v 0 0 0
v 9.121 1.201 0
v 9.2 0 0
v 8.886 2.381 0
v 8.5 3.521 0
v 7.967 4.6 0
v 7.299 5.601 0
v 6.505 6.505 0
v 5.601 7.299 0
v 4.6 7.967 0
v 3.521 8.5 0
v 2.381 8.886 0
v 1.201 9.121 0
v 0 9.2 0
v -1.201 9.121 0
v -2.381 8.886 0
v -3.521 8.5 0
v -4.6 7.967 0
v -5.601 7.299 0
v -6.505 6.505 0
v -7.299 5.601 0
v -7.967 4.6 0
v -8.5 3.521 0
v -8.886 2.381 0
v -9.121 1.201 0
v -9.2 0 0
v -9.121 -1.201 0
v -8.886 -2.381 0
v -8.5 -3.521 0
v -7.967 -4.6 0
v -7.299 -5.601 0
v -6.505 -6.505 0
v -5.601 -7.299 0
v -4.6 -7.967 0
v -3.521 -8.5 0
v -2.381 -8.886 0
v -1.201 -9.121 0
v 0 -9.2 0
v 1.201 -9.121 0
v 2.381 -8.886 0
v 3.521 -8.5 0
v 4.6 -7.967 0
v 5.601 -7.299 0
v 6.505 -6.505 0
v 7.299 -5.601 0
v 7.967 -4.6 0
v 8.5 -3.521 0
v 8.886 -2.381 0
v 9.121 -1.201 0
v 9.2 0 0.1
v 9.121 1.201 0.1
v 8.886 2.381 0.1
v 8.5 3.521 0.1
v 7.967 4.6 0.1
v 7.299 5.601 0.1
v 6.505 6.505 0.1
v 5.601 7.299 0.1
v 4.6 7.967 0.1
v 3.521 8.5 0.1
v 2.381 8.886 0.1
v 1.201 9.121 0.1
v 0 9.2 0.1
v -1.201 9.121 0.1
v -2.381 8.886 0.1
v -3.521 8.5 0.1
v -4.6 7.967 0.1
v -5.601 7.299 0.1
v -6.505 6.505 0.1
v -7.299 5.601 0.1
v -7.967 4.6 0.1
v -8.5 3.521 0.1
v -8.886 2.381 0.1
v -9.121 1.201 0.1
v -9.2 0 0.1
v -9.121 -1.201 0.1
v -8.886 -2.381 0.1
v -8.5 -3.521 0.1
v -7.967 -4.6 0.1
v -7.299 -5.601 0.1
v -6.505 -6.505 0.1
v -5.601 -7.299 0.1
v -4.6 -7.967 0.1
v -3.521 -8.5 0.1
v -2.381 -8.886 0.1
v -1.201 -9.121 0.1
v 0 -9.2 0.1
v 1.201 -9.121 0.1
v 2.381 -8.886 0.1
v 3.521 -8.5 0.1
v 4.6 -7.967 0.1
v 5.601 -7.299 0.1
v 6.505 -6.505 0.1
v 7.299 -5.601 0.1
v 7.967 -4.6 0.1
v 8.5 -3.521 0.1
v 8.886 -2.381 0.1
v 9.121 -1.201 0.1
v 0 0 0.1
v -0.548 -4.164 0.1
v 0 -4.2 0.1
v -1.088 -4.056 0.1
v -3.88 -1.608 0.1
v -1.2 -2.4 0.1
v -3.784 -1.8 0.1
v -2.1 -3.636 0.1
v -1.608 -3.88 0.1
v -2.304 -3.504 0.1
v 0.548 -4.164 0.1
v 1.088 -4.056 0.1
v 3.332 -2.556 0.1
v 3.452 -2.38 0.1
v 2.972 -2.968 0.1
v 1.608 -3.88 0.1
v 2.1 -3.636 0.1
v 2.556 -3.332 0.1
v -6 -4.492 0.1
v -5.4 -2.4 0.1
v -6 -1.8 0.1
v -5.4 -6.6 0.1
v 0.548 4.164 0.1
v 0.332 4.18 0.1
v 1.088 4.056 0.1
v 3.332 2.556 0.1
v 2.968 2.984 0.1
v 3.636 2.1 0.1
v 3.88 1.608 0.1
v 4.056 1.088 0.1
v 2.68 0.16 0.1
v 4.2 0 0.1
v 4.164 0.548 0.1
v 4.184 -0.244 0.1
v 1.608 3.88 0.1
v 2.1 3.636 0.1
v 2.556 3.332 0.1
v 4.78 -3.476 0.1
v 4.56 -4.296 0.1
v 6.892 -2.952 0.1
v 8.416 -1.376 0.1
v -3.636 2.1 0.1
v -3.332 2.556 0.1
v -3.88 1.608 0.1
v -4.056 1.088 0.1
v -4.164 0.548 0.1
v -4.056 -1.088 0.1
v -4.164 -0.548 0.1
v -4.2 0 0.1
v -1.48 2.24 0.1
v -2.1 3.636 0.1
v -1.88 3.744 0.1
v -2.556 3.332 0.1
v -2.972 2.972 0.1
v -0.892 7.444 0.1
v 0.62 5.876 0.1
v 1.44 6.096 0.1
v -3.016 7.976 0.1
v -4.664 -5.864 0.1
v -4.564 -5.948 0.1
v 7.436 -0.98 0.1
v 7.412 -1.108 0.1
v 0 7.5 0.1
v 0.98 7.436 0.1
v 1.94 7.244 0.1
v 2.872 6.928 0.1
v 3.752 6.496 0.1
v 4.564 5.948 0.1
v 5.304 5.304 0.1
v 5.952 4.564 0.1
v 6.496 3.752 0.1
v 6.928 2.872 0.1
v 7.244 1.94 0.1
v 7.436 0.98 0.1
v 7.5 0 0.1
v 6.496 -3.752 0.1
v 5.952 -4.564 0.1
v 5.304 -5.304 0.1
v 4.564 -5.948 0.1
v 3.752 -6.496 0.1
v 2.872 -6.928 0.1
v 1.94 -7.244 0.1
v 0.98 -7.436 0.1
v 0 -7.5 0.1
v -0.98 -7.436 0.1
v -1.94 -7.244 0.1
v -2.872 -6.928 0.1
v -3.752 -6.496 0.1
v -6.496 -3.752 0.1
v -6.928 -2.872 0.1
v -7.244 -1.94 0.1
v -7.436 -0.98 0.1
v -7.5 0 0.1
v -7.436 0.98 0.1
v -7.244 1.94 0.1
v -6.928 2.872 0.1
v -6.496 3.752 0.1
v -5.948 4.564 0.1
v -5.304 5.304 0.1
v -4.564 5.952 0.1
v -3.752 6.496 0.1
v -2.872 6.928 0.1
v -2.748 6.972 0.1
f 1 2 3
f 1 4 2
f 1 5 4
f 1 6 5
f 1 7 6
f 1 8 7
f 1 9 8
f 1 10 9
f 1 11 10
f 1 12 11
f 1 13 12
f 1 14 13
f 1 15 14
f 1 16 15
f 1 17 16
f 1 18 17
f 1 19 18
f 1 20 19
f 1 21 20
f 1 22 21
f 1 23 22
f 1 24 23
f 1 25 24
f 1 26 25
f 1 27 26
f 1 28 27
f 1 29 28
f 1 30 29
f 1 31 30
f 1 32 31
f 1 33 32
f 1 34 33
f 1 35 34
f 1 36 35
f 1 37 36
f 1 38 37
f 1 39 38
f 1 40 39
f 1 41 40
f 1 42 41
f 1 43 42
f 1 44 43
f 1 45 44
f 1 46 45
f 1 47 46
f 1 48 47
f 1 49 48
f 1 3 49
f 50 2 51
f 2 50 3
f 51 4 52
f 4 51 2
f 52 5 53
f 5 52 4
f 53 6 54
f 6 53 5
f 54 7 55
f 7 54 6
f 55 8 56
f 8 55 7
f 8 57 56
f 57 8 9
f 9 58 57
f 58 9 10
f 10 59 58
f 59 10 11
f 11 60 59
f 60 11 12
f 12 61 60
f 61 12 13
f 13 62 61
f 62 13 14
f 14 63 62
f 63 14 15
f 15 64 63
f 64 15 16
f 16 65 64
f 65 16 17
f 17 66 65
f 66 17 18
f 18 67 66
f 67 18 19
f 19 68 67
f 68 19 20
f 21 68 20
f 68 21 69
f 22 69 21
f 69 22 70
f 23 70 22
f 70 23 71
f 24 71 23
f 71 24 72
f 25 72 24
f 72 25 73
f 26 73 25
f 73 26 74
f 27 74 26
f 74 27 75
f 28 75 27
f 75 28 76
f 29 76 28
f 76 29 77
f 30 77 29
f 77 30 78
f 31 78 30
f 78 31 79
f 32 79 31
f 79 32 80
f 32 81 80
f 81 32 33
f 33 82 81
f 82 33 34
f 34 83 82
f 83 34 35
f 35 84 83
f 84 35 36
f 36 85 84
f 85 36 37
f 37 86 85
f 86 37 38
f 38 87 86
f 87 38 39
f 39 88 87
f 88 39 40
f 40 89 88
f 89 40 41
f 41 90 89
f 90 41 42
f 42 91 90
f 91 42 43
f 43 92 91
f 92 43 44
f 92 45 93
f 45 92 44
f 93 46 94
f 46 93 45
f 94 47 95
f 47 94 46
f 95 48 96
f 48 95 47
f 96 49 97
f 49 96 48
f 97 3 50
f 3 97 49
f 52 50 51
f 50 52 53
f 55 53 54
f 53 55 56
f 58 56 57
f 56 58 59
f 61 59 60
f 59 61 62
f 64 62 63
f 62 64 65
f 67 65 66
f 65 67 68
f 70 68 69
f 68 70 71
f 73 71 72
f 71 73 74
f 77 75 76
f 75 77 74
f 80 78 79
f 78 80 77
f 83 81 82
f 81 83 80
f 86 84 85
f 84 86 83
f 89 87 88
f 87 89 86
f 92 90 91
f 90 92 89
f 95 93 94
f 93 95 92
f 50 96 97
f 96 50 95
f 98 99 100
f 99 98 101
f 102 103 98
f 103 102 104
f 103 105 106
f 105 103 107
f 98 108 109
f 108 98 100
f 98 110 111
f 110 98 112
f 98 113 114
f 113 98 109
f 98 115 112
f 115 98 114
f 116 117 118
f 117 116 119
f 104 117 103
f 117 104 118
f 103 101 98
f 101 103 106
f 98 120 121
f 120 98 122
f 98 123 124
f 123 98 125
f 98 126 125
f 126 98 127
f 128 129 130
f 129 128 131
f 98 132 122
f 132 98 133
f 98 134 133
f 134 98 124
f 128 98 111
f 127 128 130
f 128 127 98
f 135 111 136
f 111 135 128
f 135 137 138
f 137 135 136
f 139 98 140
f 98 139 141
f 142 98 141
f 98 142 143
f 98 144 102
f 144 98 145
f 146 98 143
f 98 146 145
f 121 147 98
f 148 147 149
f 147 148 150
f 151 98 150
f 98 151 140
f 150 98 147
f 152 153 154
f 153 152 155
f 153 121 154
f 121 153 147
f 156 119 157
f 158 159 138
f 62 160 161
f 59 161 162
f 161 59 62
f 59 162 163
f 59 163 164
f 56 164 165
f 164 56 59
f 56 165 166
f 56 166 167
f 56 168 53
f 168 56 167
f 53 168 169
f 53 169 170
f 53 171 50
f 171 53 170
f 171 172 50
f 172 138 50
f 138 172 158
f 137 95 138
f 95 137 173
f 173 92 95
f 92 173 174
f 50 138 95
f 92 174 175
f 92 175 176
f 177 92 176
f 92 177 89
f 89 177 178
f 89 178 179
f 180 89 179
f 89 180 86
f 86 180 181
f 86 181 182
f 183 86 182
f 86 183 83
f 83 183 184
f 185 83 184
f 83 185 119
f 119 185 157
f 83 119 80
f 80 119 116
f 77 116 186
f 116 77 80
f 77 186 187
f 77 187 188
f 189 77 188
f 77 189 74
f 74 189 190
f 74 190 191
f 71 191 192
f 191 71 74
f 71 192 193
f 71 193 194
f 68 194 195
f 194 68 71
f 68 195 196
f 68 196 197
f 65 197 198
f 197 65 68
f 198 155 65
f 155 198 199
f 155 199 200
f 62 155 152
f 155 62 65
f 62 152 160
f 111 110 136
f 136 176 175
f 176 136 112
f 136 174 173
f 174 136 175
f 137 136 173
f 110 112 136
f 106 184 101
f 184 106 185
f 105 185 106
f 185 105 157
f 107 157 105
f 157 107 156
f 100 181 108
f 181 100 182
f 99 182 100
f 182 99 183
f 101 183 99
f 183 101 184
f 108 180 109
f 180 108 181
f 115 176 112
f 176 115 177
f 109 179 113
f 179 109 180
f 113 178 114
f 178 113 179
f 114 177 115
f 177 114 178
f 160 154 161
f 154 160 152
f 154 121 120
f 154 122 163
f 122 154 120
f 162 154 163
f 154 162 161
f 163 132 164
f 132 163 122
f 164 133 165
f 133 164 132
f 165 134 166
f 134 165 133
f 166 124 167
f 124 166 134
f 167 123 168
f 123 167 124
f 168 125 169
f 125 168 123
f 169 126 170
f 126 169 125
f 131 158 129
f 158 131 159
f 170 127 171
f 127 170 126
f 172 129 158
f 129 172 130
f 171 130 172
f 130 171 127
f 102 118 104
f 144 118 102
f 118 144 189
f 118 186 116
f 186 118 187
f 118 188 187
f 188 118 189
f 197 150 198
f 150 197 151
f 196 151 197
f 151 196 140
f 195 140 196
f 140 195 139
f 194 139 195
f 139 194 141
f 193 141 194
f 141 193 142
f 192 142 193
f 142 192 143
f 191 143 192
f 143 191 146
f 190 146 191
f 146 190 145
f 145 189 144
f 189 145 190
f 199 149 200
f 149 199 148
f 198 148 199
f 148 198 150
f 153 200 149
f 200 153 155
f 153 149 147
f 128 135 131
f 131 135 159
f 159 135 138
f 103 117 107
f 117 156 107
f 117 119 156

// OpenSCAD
// file: ../p/48/1-4cyli.scad
use <../../lib.scad>
function ldraw_lib__48__1_4cyli() = [
// 0 Hi-Res Cylinder 0.25
// 0 Name: 48\1-4cyli.dat
// 0 Author: Magnus Forsberg [MagFors]
// 0 !LDRAW_ORG 48_Primitive UPDATE 2024-01
// 0 !LICENSE Licensed under CC BY 4.0 : see CAreadme.txt
// 
// 0 BFC CERTIFY CCW
  [0,"BFC","CERTIFY"],
  [0,"BFC","CCW"],
// 
// 0 !HISTORY 1999-07-05 [PTadmin] Official Update 1999-05
// 0 !HISTORY 2002-02-28 [hafhead] Added BFC statement
// 0 !HISTORY 2002-04-25 [PTadmin] Official Update 2002-02
// 0 !HISTORY 2007-06-24 [PTadmin] Header formatted for Contributor Agreement
// 0 !HISTORY 2008-07-01 [PTadmin] Official Update 2008-01
// 0 !HISTORY 2008-07-07 [guyvivan] Made BFC'ed CCW (2005-12-06)
// 0 !HISTORY 2009-05-02 [PTadmin] Official Update 2009-01
// 0 !HISTORY 2024-01-03 [MagFors] Complete regeneration, original by Manfred Moolhuysen
// 0 !HISTORY 2024-01-29 [OrionP] Official Update 2024-01
// 
// 4 16 0.9914 0 0.1305 1 0 0 1 1 0 0.9914 1 0.1305
  [4,16,0.9914,0,0.1305,1,0,0,1,1,0,0.9914,1,0.1305],
// 4 16 0.9659 0 0.2588 0.9914 0 0.1305 0.9914 1 0.1305 0.9659 1 0.2588
  [4,16,0.9659,0,0.2588,0.9914,0,0.1305,0.9914,1,0.1305,0.9659,1,0.2588],
// 4 16 0.9239 0 0.3827 0.9659 0 0.2588 0.9659 1 0.2588 0.9239 1 0.3827
  [4,16,0.9239,0,0.3827,0.9659,0,0.2588,0.9659,1,0.2588,0.9239,1,0.3827],
// 4 16 0.866 0 0.5 0.9239 0 0.3827 0.9239 1 0.3827 0.866 1 0.5
  [4,16,0.866,0,0.5,0.9239,0,0.3827,0.9239,1,0.3827,0.866,1,0.5],
// 4 16 0.7934 0 0.6088 0.866 0 0.5 0.866 1 0.5 0.7934 1 0.6088
  [4,16,0.7934,0,0.6088,0.866,0,0.5,0.866,1,0.5,0.7934,1,0.6088],
// 4 16 0.7071 0 0.7071 0.7934 0 0.6088 0.7934 1 0.6088 0.7071 1 0.7071
  [4,16,0.7071,0,0.7071,0.7934,0,0.6088,0.7934,1,0.6088,0.7071,1,0.7071],
// 4 16 0.6088 0 0.7934 0.7071 0 0.7071 0.7071 1 0.7071 0.6088 1 0.7934
  [4,16,0.6088,0,0.7934,0.7071,0,0.7071,0.7071,1,0.7071,0.6088,1,0.7934],
// 4 16 0.5 0 0.866 0.6088 0 0.7934 0.6088 1 0.7934 0.5 1 0.866
  [4,16,0.5,0,0.866,0.6088,0,0.7934,0.6088,1,0.7934,0.5,1,0.866],
// 4 16 0.3827 0 0.9239 0.5 0 0.866 0.5 1 0.866 0.3827 1 0.9239
  [4,16,0.3827,0,0.9239,0.5,0,0.866,0.5,1,0.866,0.3827,1,0.9239],
// 4 16 0.2588 0 0.9659 0.3827 0 0.9239 0.3827 1 0.9239 0.2588 1 0.9659
  [4,16,0.2588,0,0.9659,0.3827,0,0.9239,0.3827,1,0.9239,0.2588,1,0.9659],
// 4 16 0.1305 0 0.9914 0.2588 0 0.9659 0.2588 1 0.9659 0.1305 1 0.9914
  [4,16,0.1305,0,0.9914,0.2588,0,0.9659,0.2588,1,0.9659,0.1305,1,0.9914],
// 4 16 0 0 1 0.1305 0 0.9914 0.1305 1 0.9914 0 1 1
  [4,16,0,0,1,0.1305,0,0.9914,0.1305,1,0.9914,0,1,1],
// 0 // conditional lines
// 5 24 1 1 0 1 0 0 1 1 -0.1317 0.9914 1 0.1305
  [5,24,1,1,0,1,0,0,1,1,-0.1317,0.9914,1,0.1305],
// 5 24 0.9914 1 0.1305 0.9914 0 0.1305 1 1 0 0.9659 1 0.2588
  [5,24,0.9914,1,0.1305,0.9914,0,0.1305,1,1,0,0.9659,1,0.2588],
// 5 24 0.9659 1 0.2588 0.9659 0 0.2588 0.9914 1 0.1305 0.9239 1 0.3827
  [5,24,0.9659,1,0.2588,0.9659,0,0.2588,0.9914,1,0.1305,0.9239,1,0.3827],
// 5 24 0.9239 1 0.3827 0.9239 0 0.3827 0.9659 1 0.2588 0.866 1 0.5
  [5,24,0.9239,1,0.3827,0.9239,0,0.3827,0.9659,1,0.2588,0.866,1,0.5],
// 5 24 0.866 1 0.5 0.866 0 0.5 0.9239 1 0.3827 0.7934 1 0.6088
  [5,24,0.866,1,0.5,0.866,0,0.5,0.9239,1,0.3827,0.7934,1,0.6088],
// 5 24 0.7934 1 0.6088 0.7934 0 0.6088 0.866 1 0.5 0.7071 1 0.7071
  [5,24,0.7934,1,0.6088,0.7934,0,0.6088,0.866,1,0.5,0.7071,1,0.7071],
// 5 24 0.7071 1 0.7071 0.7071 0 0.7071 0.7934 1 0.6088 0.6088 1 0.7934
  [5,24,0.7071,1,0.7071,0.7071,0,0.7071,0.7934,1,0.6088,0.6088,1,0.7934],
// 5 24 0.6088 1 0.7934 0.6088 0 0.7934 0.7071 1 0.7071 0.5 1 0.866
  [5,24,0.6088,1,0.7934,0.6088,0,0.7934,0.7071,1,0.7071,0.5,1,0.866],
// 5 24 0.5 1 0.866 0.5 0 0.866 0.6088 1 0.7934 0.3827 1 0.9239
  [5,24,0.5,1,0.866,0.5,0,0.866,0.6088,1,0.7934,0.3827,1,0.9239],
// 5 24 0.3827 1 0.9239 0.3827 0 0.9239 0.5 1 0.866 0.2588 1 0.9659
  [5,24,0.3827,1,0.9239,0.3827,0,0.9239,0.5,1,0.866,0.2588,1,0.9659],
// 5 24 0.2588 1 0.9659 0.2588 0 0.9659 0.3827 1 0.9239 0.1305 1 0.9914
  [5,24,0.2588,1,0.9659,0.2588,0,0.9659,0.3827,1,0.9239,0.1305,1,0.9914],
// 5 24 0.1305 1 0.9914 0.1305 0 0.9914 0.2588 1 0.9659 0 1 1
  [5,24,0.1305,1,0.9914,0.1305,0,0.9914,0.2588,1,0.9659,0,1,1],
// 5 24 0 1 1 0 0 1 0.1305 1 0.9914 -0.1317 1 1
  [5,24,0,1,1,0,0,1,0.1305,1,0.9914,-0.1317,1,1],
// 0 // Build by LDPartEditor (PrimGen 2.X)
];
module ldraw_lib__48__1_4cyli(step=0, col=false, unit=2/5, alt=false, line=0.2, solid=!$preview)
    makepoly(ldraw_lib__48__1_4cyli(), step=step, col=col, unit=unit, alt=alt, line=line, solid=solid);
ldraw_lib__48__1_4cyli(line=0.2);
// file: ../p/48/4-4disc.scad
use <../../lib.scad>
function ldraw_lib__48__4_4disc() = [
// 0 Hi-Res Disc 1.0
// 0 Name: 48\4-4disc.dat
// 0 Author: Willy Tschager [Holly-Wood]
// 0 !LDRAW_ORG 48_Primitive UPDATE 2024-01
// 0 !LICENSE Licensed under CC BY 4.0 : see CAreadme.txt
// 
// 0 BFC CERTIFY CCW
  [0,"BFC","CERTIFY"],
  [0,"BFC","CCW"],
// 
// 0 !HISTORY 2004-11-06 [PTadmin] Official Update 2004-04
// 0 !HISTORY 2007-06-24 [PTadmin] Header formatted for Contributor Agreement
// 0 !HISTORY 2008-07-01 [PTadmin] Official Update 2008-01
// 0 !HISTORY 2012-02-27 [Philo] Changed to CCW
// 0 !HISTORY 2012-08-09 [PTadmin] Official Update 2012-02
// 0 !HISTORY 2024-01-08 [Holly-Wood] Complete regeneration, original by hmick
// 0 !HISTORY 2024-01-29 [OrionP] Official Update 2024-01
// 
// 3 16 0 0 0 1 0 0 0.9914 0 0.1305
  [3,16,0,0,0,1,0,0,0.9914,0,0.1305],
// 3 16 0 0 0 0.9914 0 0.1305 0.9659 0 0.2588
  [3,16,0,0,0,0.9914,0,0.1305,0.9659,0,0.2588],
// 3 16 0 0 0 0.9659 0 0.2588 0.9239 0 0.3827
  [3,16,0,0,0,0.9659,0,0.2588,0.9239,0,0.3827],
// 3 16 0 0 0 0.9239 0 0.3827 0.866 0 0.5
  [3,16,0,0,0,0.9239,0,0.3827,0.866,0,0.5],
// 3 16 0 0 0 0.866 0 0.5 0.7934 0 0.6088
  [3,16,0,0,0,0.866,0,0.5,0.7934,0,0.6088],
// 3 16 0 0 0 0.7934 0 0.6088 0.7071 0 0.7071
  [3,16,0,0,0,0.7934,0,0.6088,0.7071,0,0.7071],
// 3 16 0 0 0 0.7071 0 0.7071 0.6088 0 0.7934
  [3,16,0,0,0,0.7071,0,0.7071,0.6088,0,0.7934],
// 3 16 0 0 0 0.6088 0 0.7934 0.5 0 0.866
  [3,16,0,0,0,0.6088,0,0.7934,0.5,0,0.866],
// 3 16 0 0 0 0.5 0 0.866 0.3827 0 0.9239
  [3,16,0,0,0,0.5,0,0.866,0.3827,0,0.9239],
// 3 16 0 0 0 0.3827 0 0.9239 0.2588 0 0.9659
  [3,16,0,0,0,0.3827,0,0.9239,0.2588,0,0.9659],
// 3 16 0 0 0 0.2588 0 0.9659 0.1305 0 0.9914
  [3,16,0,0,0,0.2588,0,0.9659,0.1305,0,0.9914],
// 3 16 0 0 0 0.1305 0 0.9914 0 0 1
  [3,16,0,0,0,0.1305,0,0.9914,0,0,1],
// 3 16 0 0 0 0 0 1 -0.1305 0 0.9914
  [3,16,0,0,0,0,0,1,-0.1305,0,0.9914],
// 3 16 0 0 0 -0.1305 0 0.9914 -0.2588 0 0.9659
  [3,16,0,0,0,-0.1305,0,0.9914,-0.2588,0,0.9659],
// 3 16 0 0 0 -0.2588 0 0.9659 -0.3827 0 0.9239
  [3,16,0,0,0,-0.2588,0,0.9659,-0.3827,0,0.9239],
// 3 16 0 0 0 -0.3827 0 0.9239 -0.5 0 0.866
  [3,16,0,0,0,-0.3827,0,0.9239,-0.5,0,0.866],
// 3 16 0 0 0 -0.5 0 0.866 -0.6088 0 0.7934
  [3,16,0,0,0,-0.5,0,0.866,-0.6088,0,0.7934],
// 3 16 0 0 0 -0.6088 0 0.7934 -0.7071 0 0.7071
  [3,16,0,0,0,-0.6088,0,0.7934,-0.7071,0,0.7071],
// 3 16 0 0 0 -0.7071 0 0.7071 -0.7934 0 0.6088
  [3,16,0,0,0,-0.7071,0,0.7071,-0.7934,0,0.6088],
// 3 16 0 0 0 -0.7934 0 0.6088 -0.866 0 0.5
  [3,16,0,0,0,-0.7934,0,0.6088,-0.866,0,0.5],
// 3 16 0 0 0 -0.866 0 0.5 -0.9239 0 0.3827
  [3,16,0,0,0,-0.866,0,0.5,-0.9239,0,0.3827],
// 3 16 0 0 0 -0.9239 0 0.3827 -0.9659 0 0.2588
  [3,16,0,0,0,-0.9239,0,0.3827,-0.9659,0,0.2588],
// 3 16 0 0 0 -0.9659 0 0.2588 -0.9914 0 0.1305
  [3,16,0,0,0,-0.9659,0,0.2588,-0.9914,0,0.1305],
// 3 16 0 0 0 -0.9914 0 0.1305 -1 0 0
  [3,16,0,0,0,-0.9914,0,0.1305,-1,0,0],
// 3 16 0 0 0 -1 0 0 -0.9914 0 -0.1305
  [3,16,0,0,0,-1,0,0,-0.9914,0,-0.1305],
// 3 16 0 0 0 -0.9914 0 -0.1305 -0.9659 0 -0.2588
  [3,16,0,0,0,-0.9914,0,-0.1305,-0.9659,0,-0.2588],
// 3 16 0 0 0 -0.9659 0 -0.2588 -0.9239 0 -0.3827
  [3,16,0,0,0,-0.9659,0,-0.2588,-0.9239,0,-0.3827],
// 3 16 0 0 0 -0.9239 0 -0.3827 -0.866 0 -0.5
  [3,16,0,0,0,-0.9239,0,-0.3827,-0.866,0,-0.5],
// 3 16 0 0 0 -0.866 0 -0.5 -0.7934 0 -0.6088
  [3,16,0,0,0,-0.866,0,-0.5,-0.7934,0,-0.6088],
// 3 16 0 0 0 -0.7934 0 -0.6088 -0.7071 0 -0.7071
  [3,16,0,0,0,-0.7934,0,-0.6088,-0.7071,0,-0.7071],
// 3 16 0 0 0 -0.7071 0 -0.7071 -0.6088 0 -0.7934
  [3,16,0,0,0,-0.7071,0,-0.7071,-0.6088,0,-0.7934],
// 3 16 0 0 0 -0.6088 0 -0.7934 -0.5 0 -0.866
  [3,16,0,0,0,-0.6088,0,-0.7934,-0.5,0,-0.866],
// 3 16 0 0 0 -0.5 0 -0.866 -0.3827 0 -0.9239
  [3,16,0,0,0,-0.5,0,-0.866,-0.3827,0,-0.9239],
// 3 16 0 0 0 -0.3827 0 -0.9239 -0.2588 0 -0.9659
  [3,16,0,0,0,-0.3827,0,-0.9239,-0.2588,0,-0.9659],
// 3 16 0 0 0 -0.2588 0 -0.9659 -0.1305 0 -0.9914
  [3,16,0,0,0,-0.2588,0,-0.9659,-0.1305,0,-0.9914],
// 3 16 0 0 0 -0.1305 0 -0.9914 0 0 -1
  [3,16,0,0,0,-0.1305,0,-0.9914,0,0,-1],
// 3 16 0 0 0 0 0 -1 0.1305 0 -0.9914
  [3,16,0,0,0,0,0,-1,0.1305,0,-0.9914],
// 3 16 0 0 0 0.1305 0 -0.9914 0.2588 0 -0.9659
  [3,16,0,0,0,0.1305,0,-0.9914,0.2588,0,-0.9659],
// 3 16 0 0 0 0.2588 0 -0.9659 0.3827 0 -0.9239
  [3,16,0,0,0,0.2588,0,-0.9659,0.3827,0,-0.9239],
// 3 16 0 0 0 0.3827 0 -0.9239 0.5 0 -0.866
  [3,16,0,0,0,0.3827,0,-0.9239,0.5,0,-0.866],
// 3 16 0 0 0 0.5 0 -0.866 0.6088 0 -0.7934
  [3,16,0,0,0,0.5,0,-0.866,0.6088,0,-0.7934],
// 3 16 0 0 0 0.6088 0 -0.7934 0.7071 0 -0.7071
  [3,16,0,0,0,0.6088,0,-0.7934,0.7071,0,-0.7071],
// 3 16 0 0 0 0.7071 0 -0.7071 0.7934 0 -0.6088
  [3,16,0,0,0,0.7071,0,-0.7071,0.7934,0,-0.6088],
// 3 16 0 0 0 0.7934 0 -0.6088 0.866 0 -0.5
  [3,16,0,0,0,0.7934,0,-0.6088,0.866,0,-0.5],
// 3 16 0 0 0 0.866 0 -0.5 0.9239 0 -0.3827
  [3,16,0,0,0,0.866,0,-0.5,0.9239,0,-0.3827],
// 3 16 0 0 0 0.9239 0 -0.3827 0.9659 0 -0.2588
  [3,16,0,0,0,0.9239,0,-0.3827,0.9659,0,-0.2588],
// 3 16 0 0 0 0.9659 0 -0.2588 0.9914 0 -0.1305
  [3,16,0,0,0,0.9659,0,-0.2588,0.9914,0,-0.1305],
// 3 16 0 0 0 0.9914 0 -0.1305 1 0 0
  [3,16,0,0,0,0.9914,0,-0.1305,1,0,0],
// 0 // Build by LDPartEditor (PrimGen 2.X)
];
module ldraw_lib__48__4_4disc(step=0, col=false, unit=2/5, alt=false, line=0.2, solid=!$preview)
    makepoly(ldraw_lib__48__4_4disc(), step=step, col=col, unit=unit, alt=alt, line=line, solid=solid);
ldraw_lib__48__4_4disc(line=0.2);
// file: ../p/48/4-4cyli.scad
use <../../lib.scad>
use <1-4cyli.scad>
function ldraw_lib__48__4_4cyli() = [
// 0 Hi-Res Cylinder 1.0
// 0 Name: 48\4-4cyli.dat
// 0 Author: Paul Easter [pneaster]
// 0 !LDRAW_ORG 48_Primitive UPDATE 2012-02
// 0 !LICENSE Licensed under CC BY 4.0 : see CAreadme.txt
// 
// 0 BFC CERTIFY CCW
  [0,"BFC","CERTIFY"],
  [0,"BFC","CCW"],
// 
// 0 !HISTORY 2002-08-18 [PTadmin] Official Update 2002-04
// 0 !HISTORY 2007-06-24 [PTadmin] Header formatted for Contributor Agreement
// 0 !HISTORY 2008-07-01 [PTadmin] Official Update 2008-01
// 0 !HISTORY 2012-02-27 [Philo] Changed to CCW
// 0 !HISTORY 2012-08-09 [PTadmin] Official Update 2012-02
// 
// 
// 1 16 0 0 0 1 0 0 0 1 0 0 0 1 48\1-4cyli.dat
  [1,16,0,0,0,1,0,0,0,1,0,0,0,1, ldraw_lib__48__1_4cyli()],
// 1 16 0 0 0 0 0 -1 0 1 0 1 0 0 48\1-4cyli.dat
  [1,16,0,0,0,0,0,-1,0,1,0,1,0,0, ldraw_lib__48__1_4cyli()],
// 1 16 0 0 0 -1 0 0 0 1 0 0 0 -1 48\1-4cyli.dat
  [1,16,0,0,0,-1,0,0,0,1,0,0,0,-1, ldraw_lib__48__1_4cyli()],
// 1 16 0 0 0 0 0 1 0 1 0 -1 0 0 48\1-4cyli.dat
  [1,16,0,0,0,0,0,1,0,1,0,-1,0,0, ldraw_lib__48__1_4cyli()],
];
module ldraw_lib__48__4_4cyli(step=0, col=false, unit=2/5, alt=false, line=0.2, solid=!$preview)
    makepoly(ldraw_lib__48__4_4cyli(), step=step, col=col, unit=unit, alt=alt, line=line, solid=solid);
ldraw_lib__48__4_4cyli(line=0.2);
// file: ../p/48/4-4cylc3.scad
use <../../lib.scad>
use <4-4cyli.scad>
use <4-4disc.scad>
function ldraw_lib__48__4_4cylc3() = [
// 0 Hi-Res Cylinder Closed 1.0 without Top or Bottom Edge Lines
// 0 Name: 48\4-4cylc3.dat
// 0 Author: Chris Dee [cwdee]
// 0 !LDRAW_ORG 48_Primitive UPDATE 2017-01
// 0 !LICENSE Licensed under CC BY 4.0 : see CAreadme.txt
// 
// 0 BFC CERTIFY CCW
  [0,"BFC","CERTIFY"],
  [0,"BFC","CCW"],
// 
// 0 !HISTORY 2017-12-30 [PTadmin] Official Update 2017-01
// 
// 
// 1 16 0 0 0 1 0 0 0 1 0 0 0 1 48\4-4disc.dat
  [1,16,0,0,0,1,0,0,0,1,0,0,0,1, ldraw_lib__48__4_4disc()],
// 1 16 0 0 0 1 0 0 0 1 0 0 0 1 48\4-4cyli.dat
  [1,16,0,0,0,1,0,0,0,1,0,0,0,1, ldraw_lib__48__4_4cyli()],
// 0
];
module ldraw_lib__48__4_4cylc3(step=0, col=false, unit=2/5, alt=false, line=0.2, solid=!$preview)
    makepoly(ldraw_lib__48__4_4cylc3(), step=step, col=col, unit=unit, alt=alt, line=line, solid=solid);
ldraw_lib__48__4_4cylc3(line=0.2);
// file: ../p/48/4-4aring.scad
use <../../lib.scad>
function ldraw_lib__48__4_4aring() = [
// 0 Adapter Ring Hi-Res to Normal 1.0
// 0 Name: 48\4-4aring.dat
// 0 Author: Philippe Hurbain [Philo]
// 0 !LDRAW_ORG 48_Primitive UPDATE 2010-02
// 0 !LICENSE Licensed under CC BY 4.0 : see CAreadme.txt
// 
// 0 BFC CERTIFY CCW
  [0,"BFC","CERTIFY"],
  [0,"BFC","CCW"],
// 
// 0 !HISTORY 2010-07-05 [PTadmin] Official Update 2010-02
// 
// 
// 4 16 0.9239 0 0.3827 1 0 0 0.9914 0 0.1305 0.9659 0 0.2588
  [4,16,0.9239,0,0.3827,1,0,0,0.9914,0,0.1305,0.9659,0,0.2588],
// 4 16 0.7071 0 0.7071 0.9239 0 0.3827 0.866 0 0.5 0.7934 0 0.6088
  [4,16,0.7071,0,0.7071,0.9239,0,0.3827,0.866,0,0.5,0.7934,0,0.6088],
// 4 16 0.3827 0 0.9239 0.7071 0 0.7071 0.6088 0 0.7934 0.5 0 0.866
  [4,16,0.3827,0,0.9239,0.7071,0,0.7071,0.6088,0,0.7934,0.5,0,0.866],
// 4 16 0 0 1 0.3827 0 0.9239 0.2588 0 0.9659 0.1305 0 0.9914
  [4,16,0,0,1,0.3827,0,0.9239,0.2588,0,0.9659,0.1305,0,0.9914],
// 4 16 -0.3827 0 0.9239 0 0 1 -0.1305 0 0.9914 -0.2588 0 0.9659
  [4,16,-0.3827,0,0.9239,0,0,1,-0.1305,0,0.9914,-0.2588,0,0.9659],
// 4 16 -0.7071 0 0.7071 -0.3827 0 0.9239 -0.5 0 0.866 -0.6088 0 0.7934
  [4,16,-0.7071,0,0.7071,-0.3827,0,0.9239,-0.5,0,0.866,-0.6088,0,0.7934],
// 4 16 -0.9239 0 0.3827 -0.7071 0 0.7071 -0.7934 0 0.6088 -0.866 0 0.5
  [4,16,-0.9239,0,0.3827,-0.7071,0,0.7071,-0.7934,0,0.6088,-0.866,0,0.5],
// 4 16 -1 0 0 -0.9239 0 0.3827 -0.9659 0 0.2588 -0.9914 0 0.1305
  [4,16,-1,0,0,-0.9239,0,0.3827,-0.9659,0,0.2588,-0.9914,0,0.1305],
// 4 16 -0.9239 0 -0.3827 -1 0 0 -0.9914 0 -0.1305 -0.9659 0 -0.2588
  [4,16,-0.9239,0,-0.3827,-1,0,0,-0.9914,0,-0.1305,-0.9659,0,-0.2588],
// 4 16 -0.7071 0 -0.7071 -0.9239 0 -0.3827 -0.866 0 -0.5 -0.7934 0 -0.6088
  [4,16,-0.7071,0,-0.7071,-0.9239,0,-0.3827,-0.866,0,-0.5,-0.7934,0,-0.6088],
// 4 16 -0.3827 0 -0.9239 -0.7071 0 -0.7071 -0.6088 0 -0.7934 -0.5 0 -0.866
  [4,16,-0.3827,0,-0.9239,-0.7071,0,-0.7071,-0.6088,0,-0.7934,-0.5,0,-0.866],
// 4 16 0 0 -1 -0.3827 0 -0.9239 -0.2588 0 -0.9659 -0.1305 0 -0.9914
  [4,16,0,0,-1,-0.3827,0,-0.9239,-0.2588,0,-0.9659,-0.1305,0,-0.9914],
// 4 16 0.3827 0 -0.9239 0 0 -1 0.1305 0 -0.9914 0.2588 0 -0.9659
  [4,16,0.3827,0,-0.9239,0,0,-1,0.1305,0,-0.9914,0.2588,0,-0.9659],
// 4 16 0.7071 0 -0.7071 0.3827 0 -0.9239 0.5 0 -0.866 0.6088 0 -0.7934
  [4,16,0.7071,0,-0.7071,0.3827,0,-0.9239,0.5,0,-0.866,0.6088,0,-0.7934],
// 4 16 0.9239 0 -0.3827 0.7071 0 -0.7071 0.7934 0 -0.6088 0.866 0 -0.5
  [4,16,0.9239,0,-0.3827,0.7071,0,-0.7071,0.7934,0,-0.6088,0.866,0,-0.5],
// 4 16 1 0 0 0.9239 0 -0.3827 0.9659 0 -0.2588 0.9914 0 -0.1305
  [4,16,1,0,0,0.9239,0,-0.3827,0.9659,0,-0.2588,0.9914,0,-0.1305],
// 0 //
];
module ldraw_lib__48__4_4aring(step=0, col=false, unit=2/5, alt=false, line=0.2, solid=!$preview)
    makepoly(ldraw_lib__48__4_4aring(), step=step, col=col, unit=unit, alt=alt, line=line, solid=solid);
ldraw_lib__48__4_4aring(line=0.2);
// main file
use <../lib.scad>
use <../p/48/4-4aring.scad>
use <../p/48/4-4cylc3.scad>
function ldraw_lib__165335a() = [
// 0 Sticker  2.3 x  2.3 Round with White Recycling Arrows on Transparent Background
// 0 Name: 165335a.dat
// 0 Author: Takeshi Takahashi [RainbowDolphin]
// 0 !LDRAW_ORG Part UPDATE 2024-08
// 0 !LICENSE Licensed under CC BY 4.0 : see CAreadme.txt
// 
// 0 BFC CERTIFY CCW
  [0,"BFC","CERTIFY"],
  [0,"BFC","CCW"],
// 
// 0 !KEYWORDS Bricklink 6668stk01, Brickowl 623910, garbage, Rebrickable 165335
// 0 !KEYWORDS Recycle, Set 6668
// 
// 0 !HISTORY 2024-09-30 [OrionP] Official Update 2024-08
// 
// 1 16 0 0 0 23 0 0 0 -0.25 0 0 0 23 48\4-4cylc3.dat
  [1,16,0,0,0,23,0,0,0,-0.25,0,0,0,23, ldraw_lib__48__4_4cylc3()],
// 1 16 0 -0.25 0 23 0 0 0 1 0 0 0 23 48\4-4aring.dat
  [1,16,0,-0.25,0,23,0,0,0,1,0,0,0,23, ldraw_lib__48__4_4aring()],
// 4 16 -1.37 -0.25 -10.41 0 -0.25 -10.5 0 -0.25 0 -2.72 -0.25 -10.14
  [4,16,-1.37,-0.25,-10.41,0,-0.25,-10.5,0,-0.25,0,-2.72,-0.25,-10.14],
// 4 16 -9.46 -0.25 -4.5 -3 -0.25 -6 0 -0.25 0 -9.7 -0.25 -4.019
  [4,16,-9.46,-0.25,-4.5,-3,-0.25,-6,0,-0.25,0,-9.7,-0.25,-4.019],
// 4 16 -5.25 -0.25 -9.09 -4.019 -0.25 -9.7 -3 -0.25 -6 -5.76 -0.25 -8.76
  [4,16,-5.25,-0.25,-9.09,-4.019,-0.25,-9.7,-3,-0.25,-6,-5.76,-0.25,-8.76],
// 4 16 0 -0.25 0 0 -0.25 -10.5 1.37 -0.25 -10.41 2.72 -0.25 -10.14
  [4,16,0,-0.25,0,0,-0.25,-10.5,1.37,-0.25,-10.41,2.72,-0.25,-10.14],
// 4 16 8.33 -0.25 -6.39 8.63 -0.25 -5.95 0 -0.25 0 7.43 -0.25 -7.42
  [4,16,8.33,-0.25,-6.39,8.63,-0.25,-5.95,0,-0.25,0,7.43,-0.25,-7.42],
// 4 16 0 -0.25 0 2.72 -0.25 -10.14 4.019 -0.25 -9.7 5.25 -0.25 -9.09
  [4,16,0,-0.25,0,2.72,-0.25,-10.14,4.019,-0.25,-9.7,5.25,-0.25,-9.09],
// 4 16 0 -0.25 0 5.25 -0.25 -9.09 6.39 -0.25 -8.33 7.43 -0.25 -7.42
  [4,16,0,-0.25,0,5.25,-0.25,-9.09,6.39,-0.25,-8.33,7.43,-0.25,-7.42],
// 4 16 -13.5 -0.25 -6 -15 -0.25 -4.5 -15 -0.25 -11.23 -13.5 -0.25 -16.5
  [4,16,-13.5,-0.25,-6,-15,-0.25,-4.5,-15,-0.25,-11.23,-13.5,-0.25,-16.5],
// 4 16 -15 -0.25 -4.5 -13.5 -0.25 -6 -3 -0.25 -6 -9.46 -0.25 -4.5
  [4,16,-15,-0.25,-4.5,-13.5,-0.25,-6,-3,-0.25,-6,-9.46,-0.25,-4.5],
// 4 16 -4.019 -0.25 -9.7 -2.72 -0.25 -10.14 0 -0.25 0 -3 -0.25 -6
  [4,16,-4.019,-0.25,-9.7,-2.72,-0.25,-10.14,0,-0.25,0,-3,-0.25,-6],
// 4 16 1.37 -0.25 10.41 0.83 -0.25 10.45 0 -0.25 0 2.72 -0.25 10.14
  [4,16,1.37,-0.25,10.41,0.83,-0.25,10.45,0,-0.25,0,2.72,-0.25,10.14],
// 4 16 8.33 -0.25 6.39 7.42 -0.25 7.46 0 -0.25 0 9.09 -0.25 5.25
  [4,16,8.33,-0.25,6.39,7.42,-0.25,7.46,0,-0.25,0,9.09,-0.25,5.25],
// 4 16 9.7 -0.25 4.019 9.09 -0.25 5.25 0 -0.25 0 10.14 -0.25 2.72
  [4,16,9.7,-0.25,4.019,9.09,-0.25,5.25,0,-0.25,0,10.14,-0.25,2.72],
// 4 16 6.7 -0.25 0.4 10.46 -0.25 -0.61 10.5 -0.25 0 10.41 -0.25 1.37
  [4,16,6.7,-0.25,0.4,10.46,-0.25,-0.61,10.5,-0.25,0,10.41,-0.25,1.37],
// 4 16 4.019 -0.25 9.7 2.72 -0.25 10.14 0 -0.25 0 5.25 -0.25 9.09
  [4,16,4.019,-0.25,9.7,2.72,-0.25,10.14,0,-0.25,0,5.25,-0.25,9.09],
// 4 16 6.39 -0.25 8.33 5.25 -0.25 9.09 0 -0.25 0 7.42 -0.25 7.46
  [4,16,6.39,-0.25,8.33,5.25,-0.25,9.09,0,-0.25,0,7.42,-0.25,7.46],
// 3 16 6.7 -0.25 0.4 0 -0.25 0 8.63 -0.25 -5.95
  [3,16,6.7,-0.25,0.4,0,-0.25,0,8.63,-0.25,-5.95],
// 4 16 10.41 -0.25 1.37 10.14 -0.25 2.72 0 -0.25 0 6.7 -0.25 0.4
  [4,16,10.41,-0.25,1.37,10.14,-0.25,2.72,0,-0.25,0,6.7,-0.25,0.4],
// 4 16 11.4 -0.25 -10.74 11.95 -0.25 -8.69 6.7 -0.25 0.4 8.63 -0.25 -5.95
  [4,16,11.4,-0.25,-10.74,11.95,-0.25,-8.69,6.7,-0.25,0.4,8.63,-0.25,-5.95],
// 4 16 11.95 -0.25 -8.69 11.4 -0.25 -10.74 17.23 -0.25 -7.38 21.04 -0.25 -3.44
  [4,16,11.95,-0.25,-8.69,11.4,-0.25,-10.74,17.23,-0.25,-7.38,21.04,-0.25,-3.44],
// 4 16 0 -0.25 0 -8.33 -0.25 6.39 -9.09 -0.25 5.25 -9.7 -0.25 4.019
  [4,16,0,-0.25,0,-8.33,-0.25,6.39,-9.09,-0.25,5.25,-9.7,-0.25,4.019],
// 4 16 0 -0.25 0 -9.7 -0.25 4.019 -10.14 -0.25 2.72 -10.41 -0.25 1.37
  [4,16,0,-0.25,0,-9.7,-0.25,4.019,-10.14,-0.25,2.72,-10.41,-0.25,1.37],
// 4 16 -10.14 -0.25 -2.72 -9.7 -0.25 -4.019 0 -0.25 0 -10.41 -0.25 -1.37
  [4,16,-10.14,-0.25,-2.72,-9.7,-0.25,-4.019,0,-0.25,0,-10.41,-0.25,-1.37],
// 4 16 0 -0.25 0 -10.41 -0.25 1.37 -10.5 -0.25 0 -10.41 -0.25 -1.37
  [4,16,0,-0.25,0,-10.41,-0.25,1.37,-10.5,-0.25,0,-10.41,-0.25,-1.37],
// 3 16 0.83 -0.25 10.45 -3.7 -0.25 5.6 0 -0.25 0
  [3,16,0.83,-0.25,10.45,-3.7,-0.25,5.6,0,-0.25,0],
// 4 16 -3.7 -0.25 5.6 -4.7 -0.25 9.36 -5.25 -0.25 9.09 -6.39 -0.25 8.33
  [4,16,-3.7,-0.25,5.6,-4.7,-0.25,9.36,-5.25,-0.25,9.09,-6.39,-0.25,8.33],
// 4 16 -7.43 -0.25 7.43 -8.33 -0.25 6.39 0 -0.25 0 -6.39 -0.25 8.33
  [4,16,-7.43,-0.25,7.43,-8.33,-0.25,6.39,0,-0.25,0,-6.39,-0.25,8.33],
// 3 16 -6.39 -0.25 8.33 0 -0.25 0 -3.7 -0.25 5.6
  [3,16,-6.39,-0.25,8.33,0,-0.25,0,-3.7,-0.25,5.6],
// 4 16 1.55 -0.25 14.69 3.6 -0.25 15.24 -2.23 -0.25 18.61 -7.54 -0.25 19.94
  [4,16,1.55,-0.25,14.69,3.6,-0.25,15.24,-2.23,-0.25,18.61,-7.54,-0.25,19.94],
// 4 16 3.6 -0.25 15.24 1.55 -0.25 14.69 -3.7 -0.25 5.6 0.83 -0.25 10.45
  [4,16,3.6,-0.25,15.24,1.55,-0.25,14.69,-3.7,-0.25,5.6,0.83,-0.25,10.45],
// 3 16 -11.66 -0.25 -14.66 -13.5 -0.25 -16.5 -11.41 -0.25 -14.87
  [3,16,-11.66,-0.25,-14.66,-13.5,-0.25,-16.5,-11.41,-0.25,-14.87],
// 3 16 18.59 -0.25 -2.45 18.53 -0.25 -2.77 21.04 -0.25 -3.44
  [3,16,18.59,-0.25,-2.45,18.53,-0.25,-2.77,21.04,-0.25,-3.44],
// 3 16 0 -.25 23 0 -.25 18.75 2.45 -.25 18.59
  [3,16,0,-.25,23,0,-.25,18.75,2.45,-.25,18.59],
// 4 16 0 -.25 23 2.45 -.25 18.59 4.85 -.25 18.11 8.8021 -.25 21.2497
  [4,16,0,-.25,23,2.45,-.25,18.59,4.85,-.25,18.11,8.8021,-.25,21.2497],
// 3 16 8.8021 -.25 21.2497 4.85 -.25 18.11 7.18 -.25 17.32
  [3,16,8.8021,-.25,21.2497,4.85,-.25,18.11,7.18,-.25,17.32],
// 3 16 8.8021 -.25 21.2497 7.18 -.25 17.32 9.38 -.25 16.239
  [3,16,8.8021,-.25,21.2497,7.18,-.25,17.32,9.38,-.25,16.239],
// 4 16 8.8021 -.25 21.2497 9.38 -.25 16.239 11.41 -.25 14.87 16.2633 -.25 16.2633
  [4,16,8.8021,-.25,21.2497,9.38,-.25,16.239,11.41,-.25,14.87,16.2633,-.25,16.2633],
// 3 16 16.2633 -.25 16.2633 11.41 -.25 14.87 13.26 -.25 13.26
  [3,16,16.2633,-.25,16.2633,11.41,-.25,14.87,13.26,-.25,13.26],
// 3 16 16.2633 -.25 16.2633 13.26 -.25 13.26 14.88 -.25 11.41
  [3,16,16.2633,-.25,16.2633,13.26,-.25,13.26,14.88,-.25,11.41],
// 4 16 16.2633 -.25 16.2633 14.88 -.25 11.41 16.239 -.25 9.38 21.2497 -.25 8.8021
  [4,16,16.2633,-.25,16.2633,14.88,-.25,11.41,16.239,-.25,9.38,21.2497,-.25,8.8021],
// 3 16 21.2497 -.25 8.8021 16.239 -.25 9.38 17.32 -.25 7.18
  [3,16,21.2497,-.25,8.8021,16.239,-.25,9.38,17.32,-.25,7.18],
// 3 16 21.2497 -.25 8.8021 17.32 -.25 7.18 18.11 -.25 4.85
  [3,16,21.2497,-.25,8.8021,17.32,-.25,7.18,18.11,-.25,4.85],
// 4 16 21.2497 -.25 8.8021 18.11 -.25 4.85 18.59 -.25 2.45 23 -.25 0
  [4,16,21.2497,-.25,8.8021,18.11,-.25,4.85,18.59,-.25,2.45,23,-.25,0],
// 3 16 18.59 -.25 2.45 18.75 -.25 0 23 -.25 0
  [3,16,18.59,-.25,2.45,18.75,-.25,0,23,-.25,0],
// 4 16 23 -.25 0 18.75 -.25 0 18.59 -.25 -2.45 21.04 -.25 -3.44
  [4,16,23,-.25,0,18.75,-.25,0,18.59,-.25,-2.45,21.04,-.25,-3.44],
// 4 16 21.04 -.25 -3.44 17.23 -.25 -7.38 16.239 -.25 -9.38 21.2497 -.25 -8.8021
  [4,16,21.04,-.25,-3.44,17.23,-.25,-7.38,16.239,-.25,-9.38,21.2497,-.25,-8.8021],
// 4 16 16.2633 -.25 -16.2633 21.2497 -.25 -8.8021 16.239 -.25 -9.38 14.88 -.25 -11.41
  [4,16,16.2633,-.25,-16.2633,21.2497,-.25,-8.8021,16.239,-.25,-9.38,14.88,-.25,-11.41],
// 3 16 23 -.25 0 21.04 -.25 -3.44 21.2497 -.25 -8.8021
  [3,16,23,-.25,0,21.04,-.25,-3.44,21.2497,-.25,-8.8021],
// 3 16 16.2633 -.25 -16.2633 14.88 -.25 -11.41 13.26 -.25 -13.26
  [3,16,16.2633,-.25,-16.2633,14.88,-.25,-11.41,13.26,-.25,-13.26],
// 3 16 16.2633 -.25 -16.2633 13.26 -.25 -13.26 11.41 -.25 -14.87
  [3,16,16.2633,-.25,-16.2633,13.26,-.25,-13.26,11.41,-.25,-14.87],
// 4 16 9.38 -.25 -16.239 8.8021 -.25 -21.2497 16.2633 -.25 -16.2633 11.41 -.25 -14.87
  [4,16,9.38,-.25,-16.239,8.8021,-.25,-21.2497,16.2633,-.25,-16.2633,11.41,-.25,-14.87],
// 3 16 8.8021 -.25 -21.2497 9.38 -.25 -16.239 7.18 -.25 -17.32
  [3,16,8.8021,-.25,-21.2497,9.38,-.25,-16.239,7.18,-.25,-17.32],
// 3 16 8.8021 -.25 -21.2497 7.18 -.25 -17.32 4.85 -.25 -18.11
  [3,16,8.8021,-.25,-21.2497,7.18,-.25,-17.32,4.85,-.25,-18.11],
// 4 16 0 -.25 -23 8.8021 -.25 -21.2497 4.85 -.25 -18.11 2.45 -.25 -18.59
  [4,16,0,-.25,-23,8.8021,-.25,-21.2497,4.85,-.25,-18.11,2.45,-.25,-18.59],
// 3 16 0 -.25 -23 2.45 -.25 -18.59 0 -.25 -18.75
  [3,16,0,-.25,-23,2.45,-.25,-18.59,0,-.25,-18.75],
// 3 16 0 -.25 -23 0 -.25 -18.75 -2.45 -.25 -18.59
  [3,16,0,-.25,-23,0,-.25,-18.75,-2.45,-.25,-18.59],
// 4 16 -8.8021 -.25 -21.2497 0 -.25 -23 -2.45 -.25 -18.59 -4.85 -.25 -18.11
  [4,16,-8.8021,-.25,-21.2497,0,-.25,-23,-2.45,-.25,-18.59,-4.85,-.25,-18.11],
// 3 16 -8.8021 -.25 -21.2497 -4.85 -.25 -18.11 -7.18 -.25 -17.32
  [3,16,-8.8021,-.25,-21.2497,-4.85,-.25,-18.11,-7.18,-.25,-17.32],
// 4 16 -8.8021 -.25 -21.2497 -7.18 -.25 -17.32 -9.38 -.25 -16.239 -13.5 -.25 -16.5
  [4,16,-8.8021,-.25,-21.2497,-7.18,-.25,-17.32,-9.38,-.25,-16.239,-13.5,-.25,-16.5],
// 3 16 -13.5 -.25 -16.5 -9.38 -.25 -16.239 -11.41 -.25 -14.87
  [3,16,-13.5,-.25,-16.5,-9.38,-.25,-16.239,-11.41,-.25,-14.87],
// 3 16 -8.8021 -.25 -21.2497 -13.5 -.25 -16.5 -16.2633 -.25 -16.2633
  [3,16,-8.8021,-.25,-21.2497,-13.5,-.25,-16.5,-16.2633,-.25,-16.2633],
// 3 16 -16.2633 -.25 -16.2633 -13.5 -.25 -16.5 -15 -.25 -11.23
  [3,16,-16.2633,-.25,-16.2633,-13.5,-.25,-16.5,-15,-.25,-11.23],
// 4 16 -21.2497 -.25 -8.8021 -16.2633 -.25 -16.2633 -15 -.25 -11.23 -16.239 -.25 -9.38
  [4,16,-21.2497,-.25,-8.8021,-16.2633,-.25,-16.2633,-15,-.25,-11.23,-16.239,-.25,-9.38],
// 3 16 -21.2497 -.25 -8.8021 -16.239 -.25 -9.38 -17.32 -.25 -7.18
  [3,16,-21.2497,-.25,-8.8021,-16.239,-.25,-9.38,-17.32,-.25,-7.18],
// 3 16 -21.2497 -.25 -8.8021 -17.32 -.25 -7.18 -18.11 -.25 -4.85
  [3,16,-21.2497,-.25,-8.8021,-17.32,-.25,-7.18,-18.11,-.25,-4.85],
// 4 16 -23 -.25 0 -21.2497 -.25 -8.8021 -18.11 -.25 -4.85 -18.59 -.25 -2.45
  [4,16,-23,-.25,0,-21.2497,-.25,-8.8021,-18.11,-.25,-4.85,-18.59,-.25,-2.45],
// 3 16 -23 -.25 0 -18.59 -.25 -2.45 -18.75 -.25 0
  [3,16,-23,-.25,0,-18.59,-.25,-2.45,-18.75,-.25,0],
// 3 16 -23 -.25 0 -18.75 -.25 0 -18.59 -.25 2.45
  [3,16,-23,-.25,0,-18.75,-.25,0,-18.59,-.25,2.45],
// 4 16 -23 -.25 0 -18.59 -.25 2.45 -18.11 -.25 4.85 -21.2497 -.25 8.8021
  [4,16,-23,-.25,0,-18.59,-.25,2.45,-18.11,-.25,4.85,-21.2497,-.25,8.8021],
// 3 16 -21.2497 -.25 8.8021 -18.11 -.25 4.85 -17.32 -.25 7.18
  [3,16,-21.2497,-.25,8.8021,-18.11,-.25,4.85,-17.32,-.25,7.18],
// 3 16 -21.2497 -.25 8.8021 -17.32 -.25 7.18 -16.239 -.25 9.38
  [3,16,-21.2497,-.25,8.8021,-17.32,-.25,7.18,-16.239,-.25,9.38],
// 4 16 -16.2633 -.25 16.2633 -21.2497 -.25 8.8021 -16.239 -.25 9.38 -14.87 -.25 11.41
  [4,16,-16.2633,-.25,16.2633,-21.2497,-.25,8.8021,-16.239,-.25,9.38,-14.87,-.25,11.41],
// 3 16 -16.2633 -.25 16.2633 -14.87 -.25 11.41 -13.26 -.25 13.26
  [3,16,-16.2633,-.25,16.2633,-14.87,-.25,11.41,-13.26,-.25,13.26],
// 3 16 -16.2633 -.25 16.2633 -13.26 -.25 13.26 -11.41 -.25 14.88
  [3,16,-16.2633,-.25,16.2633,-13.26,-.25,13.26,-11.41,-.25,14.88],
// 4 16 -16.2633 -.25 16.2633 -11.41 -.25 14.88 -9.38 -.25 16.239 -8.8021 -.25 21.2497
  [4,16,-16.2633,-.25,16.2633,-11.41,-.25,14.88,-9.38,-.25,16.239,-8.8021,-.25,21.2497],
// 4 16 -8.8021 -.25 21.2497 -9.38 -.25 16.239 -7.18 -.25 17.32 -7.54 -.25 19.94
  [4,16,-8.8021,-.25,21.2497,-9.38,-.25,16.239,-7.18,-.25,17.32,-7.54,-.25,19.94],
// 3 16 -7.54 -.25 19.94 -7.18 -.25 17.32 -6.87 -.25 17.43
  [3,16,-7.54,-.25,19.94,-7.18,-.25,17.32,-6.87,-.25,17.43],
// 4 16 -8.8021 -.25 21.2497 -7.54 -.25 19.94 -2.23 -.25 18.61 0 -.25 23
  [4,16,-8.8021,-.25,21.2497,-7.54,-.25,19.94,-2.23,-.25,18.61,0,-.25,23],
// 3 16 0 -.25 23 -2.23 -.25 18.61 0 -.25 18.75
  [3,16,0,-.25,23,-2.23,-.25,18.61,0,-.25,18.75],
// 0 BFC NOCLIP
  [0,"BFC","NOCLIP"],
// 3 15 8.63 -0.25 -5.95 8.33 -0.25 -6.39 11.4 -0.25 -10.74
  [3,15,8.63,-0.25,-5.95,8.33,-0.25,-6.39,11.4,-0.25,-10.74],
// 4 15 11.41 -0.25 -14.87 13.26 -0.25 -13.26 11.4 -0.25 -10.74 7.43 -0.25 -7.42
  [4,15,11.41,-0.25,-14.87,13.26,-0.25,-13.26,11.4,-0.25,-10.74,7.43,-0.25,-7.42],
// 4 15 11.4 -0.25 -10.74 13.26 -0.25 -13.26 14.88 -0.25 -11.41 16.239 -0.25 -9.38
  [4,15,11.4,-0.25,-10.74,13.26,-0.25,-13.26,14.88,-0.25,-11.41,16.239,-0.25,-9.38],
// 3 15 17.23 -0.25 -7.38 11.4 -0.25 -10.74 16.239 -0.25 -9.38
  [3,15,17.23,-0.25,-7.38,11.4,-0.25,-10.74,16.239,-0.25,-9.38],
// 3 15 8.33 -0.25 -6.39 7.43 -0.25 -7.42 11.4 -0.25 -10.74
  [3,15,8.33,-0.25,-6.39,7.43,-0.25,-7.42,11.4,-0.25,-10.74],
// 4 15 -9.38 -0.25 -16.239 -7.18 -0.25 -17.32 -2.72 -0.25 -10.14 -4.019 -0.25 -9.7
  [4,15,-9.38,-0.25,-16.239,-7.18,-0.25,-17.32,-2.72,-0.25,-10.14,-4.019,-0.25,-9.7],
// 4 15 -11.41 -0.25 -14.87 -9.38 -0.25 -16.239 -4.019 -0.25 -9.7 -5.25 -0.25 -9.09
  [4,15,-11.41,-0.25,-14.87,-9.38,-0.25,-16.239,-4.019,-0.25,-9.7,-5.25,-0.25,-9.09],
// 4 15 -11.66 -0.25 -14.66 -11.41 -0.25 -14.87 -5.25 -0.25 -9.09 -5.76 -0.25 -8.76
  [4,15,-11.66,-0.25,-14.66,-11.41,-0.25,-14.87,-5.25,-0.25,-9.09,-5.76,-0.25,-8.76],
// 4 15 -2.45 -0.25 -18.59 0 -0.25 -18.75 1.37 -0.25 -10.41 0 -0.25 -10.5
  [4,15,-2.45,-0.25,-18.59,0,-0.25,-18.75,1.37,-0.25,-10.41,0,-0.25,-10.5],
// 4 15 -4.85 -0.25 -18.11 -2.45 -0.25 -18.59 0 -0.25 -10.5 -1.37 -0.25 -10.41
  [4,15,-4.85,-0.25,-18.11,-2.45,-0.25,-18.59,0,-0.25,-10.5,-1.37,-0.25,-10.41],
// 4 15 -7.18 -0.25 -17.32 -4.85 -0.25 -18.11 -1.37 -0.25 -10.41 -2.72 -0.25 -10.14
  [4,15,-7.18,-0.25,-17.32,-4.85,-0.25,-18.11,-1.37,-0.25,-10.41,-2.72,-0.25,-10.14],
// 4 15 0 -0.25 -18.75 2.45 -0.25 -18.59 2.72 -0.25 -10.14 1.37 -0.25 -10.41
  [4,15,0,-0.25,-18.75,2.45,-0.25,-18.59,2.72,-0.25,-10.14,1.37,-0.25,-10.41],
// 4 15 9.38 -0.25 -16.239 11.41 -0.25 -14.87 7.43 -0.25 -7.42 6.39 -0.25 -8.33
  [4,15,9.38,-0.25,-16.239,11.41,-0.25,-14.87,7.43,-0.25,-7.42,6.39,-0.25,-8.33],
// 4 15 2.45 -0.25 -18.59 4.85 -0.25 -18.11 4.019 -0.25 -9.7 2.72 -0.25 -10.14
  [4,15,2.45,-0.25,-18.59,4.85,-0.25,-18.11,4.019,-0.25,-9.7,2.72,-0.25,-10.14],
// 4 15 4.85 -0.25 -18.11 7.18 -0.25 -17.32 5.25 -0.25 -9.09 4.019 -0.25 -9.7
  [4,15,4.85,-0.25,-18.11,7.18,-0.25,-17.32,5.25,-0.25,-9.09,4.019,-0.25,-9.7],
// 4 15 7.18 -0.25 -17.32 9.38 -0.25 -16.239 6.39 -0.25 -8.33 5.25 -0.25 -9.09
  [4,15,7.18,-0.25,-17.32,9.38,-0.25,-16.239,6.39,-0.25,-8.33,5.25,-0.25,-9.09],
// 4 15 0 -0.25 18.75 -2.23 -0.25 18.61 3.6 -0.25 15.24 2.45 -0.25 18.59
  [4,15,0,-0.25,18.75,-2.23,-0.25,18.61,3.6,-0.25,15.24,2.45,-0.25,18.59],
// 3 15 3.6 -0.25 15.24 0.83 -0.25 10.45 1.37 -0.25 10.41
  [3,15,3.6,-0.25,15.24,0.83,-0.25,10.45,1.37,-0.25,10.41],
// 4 15 3.6 -0.25 15.24 1.37 -0.25 10.41 2.72 -0.25 10.14 7.18 -0.25 17.32
  [4,15,3.6,-0.25,15.24,1.37,-0.25,10.41,2.72,-0.25,10.14,7.18,-0.25,17.32],
// 4 15 4.85 -0.25 18.11 2.45 -0.25 18.59 3.6 -0.25 15.24 7.18 -0.25 17.32
  [4,15,4.85,-0.25,18.11,2.45,-0.25,18.59,3.6,-0.25,15.24,7.18,-0.25,17.32],
// 4 15 9.38 -0.25 16.239 7.18 -0.25 17.32 2.72 -0.25 10.14 4.019 -0.25 9.7
  [4,15,9.38,-0.25,16.239,7.18,-0.25,17.32,2.72,-0.25,10.14,4.019,-0.25,9.7],
// 4 15 11.41 -0.25 14.87 9.38 -0.25 16.239 4.019 -0.25 9.7 5.25 -0.25 9.09
  [4,15,11.41,-0.25,14.87,9.38,-0.25,16.239,4.019,-0.25,9.7,5.25,-0.25,9.09],
// 4 15 13.26 -0.25 13.26 11.41 -0.25 14.87 5.25 -0.25 9.09 6.39 -0.25 8.33
  [4,15,13.26,-0.25,13.26,11.41,-0.25,14.87,5.25,-0.25,9.09,6.39,-0.25,8.33],
// 4 15 14.88 -0.25 11.41 13.26 -0.25 13.26 6.39 -0.25 8.33 7.42 -0.25 7.46
  [4,15,14.88,-0.25,11.41,13.26,-0.25,13.26,6.39,-0.25,8.33,7.42,-0.25,7.46],
// 4 15 16.239 -0.25 9.38 14.88 -0.25 11.41 7.42 -0.25 7.46 8.33 -0.25 6.39
  [4,15,16.239,-0.25,9.38,14.88,-0.25,11.41,7.42,-0.25,7.46,8.33,-0.25,6.39],
// 4 15 17.32 -0.25 7.18 16.239 -0.25 9.38 8.33 -0.25 6.39 9.09 -0.25 5.25
  [4,15,17.32,-0.25,7.18,16.239,-0.25,9.38,8.33,-0.25,6.39,9.09,-0.25,5.25],
// 4 15 18.11 -0.25 4.85 17.32 -0.25 7.18 9.09 -0.25 5.25 9.7 -0.25 4.019
  [4,15,18.11,-0.25,4.85,17.32,-0.25,7.18,9.09,-0.25,5.25,9.7,-0.25,4.019],
// 4 15 18.53 -0.25 -2.77 18.59 -0.25 -2.45 10.5 -0.25 0 10.46 -0.25 -0.61
  [4,15,18.53,-0.25,-2.77,18.59,-0.25,-2.45,10.5,-0.25,0,10.46,-0.25,-0.61],
// 4 15 18.59 -0.25 2.45 18.11 -0.25 4.85 9.7 -0.25 4.019 10.14 -0.25 2.72
  [4,15,18.59,-0.25,2.45,18.11,-0.25,4.85,9.7,-0.25,4.019,10.14,-0.25,2.72],
// 4 15 18.59 -0.25 -2.45 18.75 -0.25 0 10.41 -0.25 1.37 10.5 -0.25 0
  [4,15,18.59,-0.25,-2.45,18.75,-0.25,0,10.41,-0.25,1.37,10.5,-0.25,0],
// 4 15 18.75 -0.25 0 18.59 -0.25 2.45 10.14 -0.25 2.72 10.41 -0.25 1.37
  [4,15,18.75,-0.25,0,18.59,-0.25,2.45,10.14,-0.25,2.72,10.41,-0.25,1.37],
// 3 15 -9.7 -0.25 -4.019 -15 -0.25 -4.5 -9.46 -0.25 -4.5
  [3,15,-9.7,-0.25,-4.019,-15,-0.25,-4.5,-9.46,-0.25,-4.5],
// 4 15 -15 -0.25 -4.5 -9.7 -0.25 -4.019 -10.14 -0.25 -2.72 -18.59 -0.25 -2.45
  [4,15,-15,-0.25,-4.5,-9.7,-0.25,-4.019,-10.14,-0.25,-2.72,-18.59,-0.25,-2.45],
// 4 15 -16.239 -0.25 -9.38 -15 -0.25 -11.23 -15 -0.25 -4.5 -17.32 -0.25 -7.18
  [4,15,-16.239,-0.25,-9.38,-15,-0.25,-11.23,-15,-0.25,-4.5,-17.32,-0.25,-7.18],
// 4 15 -18.11 -0.25 -4.85 -17.32 -0.25 -7.18 -15 -0.25 -4.5 -18.59 -0.25 -2.45
  [4,15,-18.11,-0.25,-4.85,-17.32,-0.25,-7.18,-15,-0.25,-4.5,-18.59,-0.25,-2.45],
// 4 15 -9.38 -0.25 16.239 -11.41 -0.25 14.88 -7.43 -0.25 7.43 -6.39 -0.25 8.33
  [4,15,-9.38,-0.25,16.239,-11.41,-0.25,14.88,-7.43,-0.25,7.43,-6.39,-0.25,8.33],
// 4 15 -11.41 -0.25 14.88 -13.26 -0.25 13.26 -8.33 -0.25 6.39 -7.43 -0.25 7.43
  [4,15,-11.41,-0.25,14.88,-13.26,-0.25,13.26,-8.33,-0.25,6.39,-7.43,-0.25,7.43],
// 4 15 -13.26 -0.25 13.26 -14.87 -0.25 11.41 -9.09 -0.25 5.25 -8.33 -0.25 6.39
  [4,15,-13.26,-0.25,13.26,-14.87,-0.25,11.41,-9.09,-0.25,5.25,-8.33,-0.25,6.39],
// 4 15 -14.87 -0.25 11.41 -16.239 -0.25 9.38 -9.7 -0.25 4.019 -9.09 -0.25 5.25
  [4,15,-14.87,-0.25,11.41,-16.239,-0.25,9.38,-9.7,-0.25,4.019,-9.09,-0.25,5.25],
// 4 15 -16.239 -0.25 9.38 -17.32 -0.25 7.18 -10.14 -0.25 2.72 -9.7 -0.25 4.019
  [4,15,-16.239,-0.25,9.38,-17.32,-0.25,7.18,-10.14,-0.25,2.72,-9.7,-0.25,4.019],
// 4 15 -17.32 -0.25 7.18 -18.11 -0.25 4.85 -10.41 -0.25 1.37 -10.14 -0.25 2.72
  [4,15,-17.32,-0.25,7.18,-18.11,-0.25,4.85,-10.41,-0.25,1.37,-10.14,-0.25,2.72],
// 4 15 -18.11 -0.25 4.85 -18.59 -0.25 2.45 -10.5 -0.25 0 -10.41 -0.25 1.37
  [4,15,-18.11,-0.25,4.85,-18.59,-0.25,2.45,-10.5,-0.25,0,-10.41,-0.25,1.37],
// 4 15 -18.59 -0.25 2.45 -18.75 -0.25 0 -10.41 -0.25 -1.37 -10.5 -0.25 0
  [4,15,-18.59,-0.25,2.45,-18.75,-0.25,0,-10.41,-0.25,-1.37,-10.5,-0.25,0],
// 4 15 -18.75 -0.25 0 -18.59 -0.25 -2.45 -10.14 -0.25 -2.72 -10.41 -0.25 -1.37
  [4,15,-18.75,-0.25,0,-18.59,-0.25,-2.45,-10.14,-0.25,-2.72,-10.41,-0.25,-1.37],
// 4 15 -6.87 -0.25 17.43 -7.18 -0.25 17.32 -5.25 -0.25 9.09 -4.7 -0.25 9.36
  [4,15,-6.87,-0.25,17.43,-7.18,-0.25,17.32,-5.25,-0.25,9.09,-4.7,-0.25,9.36],
// 4 15 -7.18 -0.25 17.32 -9.38 -0.25 16.239 -6.39 -0.25 8.33 -5.25 -0.25 9.09
  [4,15,-7.18,-0.25,17.32,-9.38,-0.25,16.239,-6.39,-0.25,8.33,-5.25,-0.25,9.09],
// 4 15 1.55 -0.25 14.69 -7.54 -0.25 19.94 -6.87 -0.25 17.43 -4.7 -0.25 9.36
  [4,15,1.55,-0.25,14.69,-7.54,-0.25,19.94,-6.87,-0.25,17.43,-4.7,-0.25,9.36],
// 3 15 1.55 -0.25 14.69 -4.7 -0.25 9.36 -3.7 -0.25 5.6
  [3,15,1.55,-0.25,14.69,-4.7,-0.25,9.36,-3.7,-0.25,5.6],
// 3 15 6.7 -0.25 0.4 11.95 -0.25 -8.69 10.46 -0.25 -0.61
  [3,15,6.7,-0.25,0.4,11.95,-0.25,-8.69,10.46,-0.25,-0.61],
// 3 15 10.46 -0.25 -0.61 11.95 -0.25 -8.69 18.53 -0.25 -2.77
  [3,15,10.46,-0.25,-0.61,11.95,-0.25,-8.69,18.53,-0.25,-2.77],
// 3 15 18.53 -0.25 -2.77 11.95 -0.25 -8.69 21.04 -0.25 -3.44
  [3,15,18.53,-0.25,-2.77,11.95,-0.25,-8.69,21.04,-0.25,-3.44],
// 3 15 -3 -0.25 -6 -13.5 -0.25 -6 -5.76 -0.25 -8.76
  [3,15,-3,-0.25,-6,-13.5,-0.25,-6,-5.76,-0.25,-8.76],
// 3 15 -13.5 -0.25 -6 -11.66 -0.25 -14.66 -5.76 -0.25 -8.76
  [3,15,-13.5,-0.25,-6,-11.66,-0.25,-14.66,-5.76,-0.25,-8.76],
// 3 15 -13.5 -0.25 -6 -13.5 -0.25 -16.5 -11.66 -0.25 -14.66
  [3,15,-13.5,-0.25,-6,-13.5,-0.25,-16.5,-11.66,-0.25,-14.66],
];
module ldraw_lib__165335a(step=0, col=false, unit=2/5, alt=false, line=0.2, solid=!$preview)
    makepoly(ldraw_lib__165335a(), step=step, col=col, unit=unit, alt=alt, line=line, solid=solid);
ldraw_lib__165335a(line=0.2);
